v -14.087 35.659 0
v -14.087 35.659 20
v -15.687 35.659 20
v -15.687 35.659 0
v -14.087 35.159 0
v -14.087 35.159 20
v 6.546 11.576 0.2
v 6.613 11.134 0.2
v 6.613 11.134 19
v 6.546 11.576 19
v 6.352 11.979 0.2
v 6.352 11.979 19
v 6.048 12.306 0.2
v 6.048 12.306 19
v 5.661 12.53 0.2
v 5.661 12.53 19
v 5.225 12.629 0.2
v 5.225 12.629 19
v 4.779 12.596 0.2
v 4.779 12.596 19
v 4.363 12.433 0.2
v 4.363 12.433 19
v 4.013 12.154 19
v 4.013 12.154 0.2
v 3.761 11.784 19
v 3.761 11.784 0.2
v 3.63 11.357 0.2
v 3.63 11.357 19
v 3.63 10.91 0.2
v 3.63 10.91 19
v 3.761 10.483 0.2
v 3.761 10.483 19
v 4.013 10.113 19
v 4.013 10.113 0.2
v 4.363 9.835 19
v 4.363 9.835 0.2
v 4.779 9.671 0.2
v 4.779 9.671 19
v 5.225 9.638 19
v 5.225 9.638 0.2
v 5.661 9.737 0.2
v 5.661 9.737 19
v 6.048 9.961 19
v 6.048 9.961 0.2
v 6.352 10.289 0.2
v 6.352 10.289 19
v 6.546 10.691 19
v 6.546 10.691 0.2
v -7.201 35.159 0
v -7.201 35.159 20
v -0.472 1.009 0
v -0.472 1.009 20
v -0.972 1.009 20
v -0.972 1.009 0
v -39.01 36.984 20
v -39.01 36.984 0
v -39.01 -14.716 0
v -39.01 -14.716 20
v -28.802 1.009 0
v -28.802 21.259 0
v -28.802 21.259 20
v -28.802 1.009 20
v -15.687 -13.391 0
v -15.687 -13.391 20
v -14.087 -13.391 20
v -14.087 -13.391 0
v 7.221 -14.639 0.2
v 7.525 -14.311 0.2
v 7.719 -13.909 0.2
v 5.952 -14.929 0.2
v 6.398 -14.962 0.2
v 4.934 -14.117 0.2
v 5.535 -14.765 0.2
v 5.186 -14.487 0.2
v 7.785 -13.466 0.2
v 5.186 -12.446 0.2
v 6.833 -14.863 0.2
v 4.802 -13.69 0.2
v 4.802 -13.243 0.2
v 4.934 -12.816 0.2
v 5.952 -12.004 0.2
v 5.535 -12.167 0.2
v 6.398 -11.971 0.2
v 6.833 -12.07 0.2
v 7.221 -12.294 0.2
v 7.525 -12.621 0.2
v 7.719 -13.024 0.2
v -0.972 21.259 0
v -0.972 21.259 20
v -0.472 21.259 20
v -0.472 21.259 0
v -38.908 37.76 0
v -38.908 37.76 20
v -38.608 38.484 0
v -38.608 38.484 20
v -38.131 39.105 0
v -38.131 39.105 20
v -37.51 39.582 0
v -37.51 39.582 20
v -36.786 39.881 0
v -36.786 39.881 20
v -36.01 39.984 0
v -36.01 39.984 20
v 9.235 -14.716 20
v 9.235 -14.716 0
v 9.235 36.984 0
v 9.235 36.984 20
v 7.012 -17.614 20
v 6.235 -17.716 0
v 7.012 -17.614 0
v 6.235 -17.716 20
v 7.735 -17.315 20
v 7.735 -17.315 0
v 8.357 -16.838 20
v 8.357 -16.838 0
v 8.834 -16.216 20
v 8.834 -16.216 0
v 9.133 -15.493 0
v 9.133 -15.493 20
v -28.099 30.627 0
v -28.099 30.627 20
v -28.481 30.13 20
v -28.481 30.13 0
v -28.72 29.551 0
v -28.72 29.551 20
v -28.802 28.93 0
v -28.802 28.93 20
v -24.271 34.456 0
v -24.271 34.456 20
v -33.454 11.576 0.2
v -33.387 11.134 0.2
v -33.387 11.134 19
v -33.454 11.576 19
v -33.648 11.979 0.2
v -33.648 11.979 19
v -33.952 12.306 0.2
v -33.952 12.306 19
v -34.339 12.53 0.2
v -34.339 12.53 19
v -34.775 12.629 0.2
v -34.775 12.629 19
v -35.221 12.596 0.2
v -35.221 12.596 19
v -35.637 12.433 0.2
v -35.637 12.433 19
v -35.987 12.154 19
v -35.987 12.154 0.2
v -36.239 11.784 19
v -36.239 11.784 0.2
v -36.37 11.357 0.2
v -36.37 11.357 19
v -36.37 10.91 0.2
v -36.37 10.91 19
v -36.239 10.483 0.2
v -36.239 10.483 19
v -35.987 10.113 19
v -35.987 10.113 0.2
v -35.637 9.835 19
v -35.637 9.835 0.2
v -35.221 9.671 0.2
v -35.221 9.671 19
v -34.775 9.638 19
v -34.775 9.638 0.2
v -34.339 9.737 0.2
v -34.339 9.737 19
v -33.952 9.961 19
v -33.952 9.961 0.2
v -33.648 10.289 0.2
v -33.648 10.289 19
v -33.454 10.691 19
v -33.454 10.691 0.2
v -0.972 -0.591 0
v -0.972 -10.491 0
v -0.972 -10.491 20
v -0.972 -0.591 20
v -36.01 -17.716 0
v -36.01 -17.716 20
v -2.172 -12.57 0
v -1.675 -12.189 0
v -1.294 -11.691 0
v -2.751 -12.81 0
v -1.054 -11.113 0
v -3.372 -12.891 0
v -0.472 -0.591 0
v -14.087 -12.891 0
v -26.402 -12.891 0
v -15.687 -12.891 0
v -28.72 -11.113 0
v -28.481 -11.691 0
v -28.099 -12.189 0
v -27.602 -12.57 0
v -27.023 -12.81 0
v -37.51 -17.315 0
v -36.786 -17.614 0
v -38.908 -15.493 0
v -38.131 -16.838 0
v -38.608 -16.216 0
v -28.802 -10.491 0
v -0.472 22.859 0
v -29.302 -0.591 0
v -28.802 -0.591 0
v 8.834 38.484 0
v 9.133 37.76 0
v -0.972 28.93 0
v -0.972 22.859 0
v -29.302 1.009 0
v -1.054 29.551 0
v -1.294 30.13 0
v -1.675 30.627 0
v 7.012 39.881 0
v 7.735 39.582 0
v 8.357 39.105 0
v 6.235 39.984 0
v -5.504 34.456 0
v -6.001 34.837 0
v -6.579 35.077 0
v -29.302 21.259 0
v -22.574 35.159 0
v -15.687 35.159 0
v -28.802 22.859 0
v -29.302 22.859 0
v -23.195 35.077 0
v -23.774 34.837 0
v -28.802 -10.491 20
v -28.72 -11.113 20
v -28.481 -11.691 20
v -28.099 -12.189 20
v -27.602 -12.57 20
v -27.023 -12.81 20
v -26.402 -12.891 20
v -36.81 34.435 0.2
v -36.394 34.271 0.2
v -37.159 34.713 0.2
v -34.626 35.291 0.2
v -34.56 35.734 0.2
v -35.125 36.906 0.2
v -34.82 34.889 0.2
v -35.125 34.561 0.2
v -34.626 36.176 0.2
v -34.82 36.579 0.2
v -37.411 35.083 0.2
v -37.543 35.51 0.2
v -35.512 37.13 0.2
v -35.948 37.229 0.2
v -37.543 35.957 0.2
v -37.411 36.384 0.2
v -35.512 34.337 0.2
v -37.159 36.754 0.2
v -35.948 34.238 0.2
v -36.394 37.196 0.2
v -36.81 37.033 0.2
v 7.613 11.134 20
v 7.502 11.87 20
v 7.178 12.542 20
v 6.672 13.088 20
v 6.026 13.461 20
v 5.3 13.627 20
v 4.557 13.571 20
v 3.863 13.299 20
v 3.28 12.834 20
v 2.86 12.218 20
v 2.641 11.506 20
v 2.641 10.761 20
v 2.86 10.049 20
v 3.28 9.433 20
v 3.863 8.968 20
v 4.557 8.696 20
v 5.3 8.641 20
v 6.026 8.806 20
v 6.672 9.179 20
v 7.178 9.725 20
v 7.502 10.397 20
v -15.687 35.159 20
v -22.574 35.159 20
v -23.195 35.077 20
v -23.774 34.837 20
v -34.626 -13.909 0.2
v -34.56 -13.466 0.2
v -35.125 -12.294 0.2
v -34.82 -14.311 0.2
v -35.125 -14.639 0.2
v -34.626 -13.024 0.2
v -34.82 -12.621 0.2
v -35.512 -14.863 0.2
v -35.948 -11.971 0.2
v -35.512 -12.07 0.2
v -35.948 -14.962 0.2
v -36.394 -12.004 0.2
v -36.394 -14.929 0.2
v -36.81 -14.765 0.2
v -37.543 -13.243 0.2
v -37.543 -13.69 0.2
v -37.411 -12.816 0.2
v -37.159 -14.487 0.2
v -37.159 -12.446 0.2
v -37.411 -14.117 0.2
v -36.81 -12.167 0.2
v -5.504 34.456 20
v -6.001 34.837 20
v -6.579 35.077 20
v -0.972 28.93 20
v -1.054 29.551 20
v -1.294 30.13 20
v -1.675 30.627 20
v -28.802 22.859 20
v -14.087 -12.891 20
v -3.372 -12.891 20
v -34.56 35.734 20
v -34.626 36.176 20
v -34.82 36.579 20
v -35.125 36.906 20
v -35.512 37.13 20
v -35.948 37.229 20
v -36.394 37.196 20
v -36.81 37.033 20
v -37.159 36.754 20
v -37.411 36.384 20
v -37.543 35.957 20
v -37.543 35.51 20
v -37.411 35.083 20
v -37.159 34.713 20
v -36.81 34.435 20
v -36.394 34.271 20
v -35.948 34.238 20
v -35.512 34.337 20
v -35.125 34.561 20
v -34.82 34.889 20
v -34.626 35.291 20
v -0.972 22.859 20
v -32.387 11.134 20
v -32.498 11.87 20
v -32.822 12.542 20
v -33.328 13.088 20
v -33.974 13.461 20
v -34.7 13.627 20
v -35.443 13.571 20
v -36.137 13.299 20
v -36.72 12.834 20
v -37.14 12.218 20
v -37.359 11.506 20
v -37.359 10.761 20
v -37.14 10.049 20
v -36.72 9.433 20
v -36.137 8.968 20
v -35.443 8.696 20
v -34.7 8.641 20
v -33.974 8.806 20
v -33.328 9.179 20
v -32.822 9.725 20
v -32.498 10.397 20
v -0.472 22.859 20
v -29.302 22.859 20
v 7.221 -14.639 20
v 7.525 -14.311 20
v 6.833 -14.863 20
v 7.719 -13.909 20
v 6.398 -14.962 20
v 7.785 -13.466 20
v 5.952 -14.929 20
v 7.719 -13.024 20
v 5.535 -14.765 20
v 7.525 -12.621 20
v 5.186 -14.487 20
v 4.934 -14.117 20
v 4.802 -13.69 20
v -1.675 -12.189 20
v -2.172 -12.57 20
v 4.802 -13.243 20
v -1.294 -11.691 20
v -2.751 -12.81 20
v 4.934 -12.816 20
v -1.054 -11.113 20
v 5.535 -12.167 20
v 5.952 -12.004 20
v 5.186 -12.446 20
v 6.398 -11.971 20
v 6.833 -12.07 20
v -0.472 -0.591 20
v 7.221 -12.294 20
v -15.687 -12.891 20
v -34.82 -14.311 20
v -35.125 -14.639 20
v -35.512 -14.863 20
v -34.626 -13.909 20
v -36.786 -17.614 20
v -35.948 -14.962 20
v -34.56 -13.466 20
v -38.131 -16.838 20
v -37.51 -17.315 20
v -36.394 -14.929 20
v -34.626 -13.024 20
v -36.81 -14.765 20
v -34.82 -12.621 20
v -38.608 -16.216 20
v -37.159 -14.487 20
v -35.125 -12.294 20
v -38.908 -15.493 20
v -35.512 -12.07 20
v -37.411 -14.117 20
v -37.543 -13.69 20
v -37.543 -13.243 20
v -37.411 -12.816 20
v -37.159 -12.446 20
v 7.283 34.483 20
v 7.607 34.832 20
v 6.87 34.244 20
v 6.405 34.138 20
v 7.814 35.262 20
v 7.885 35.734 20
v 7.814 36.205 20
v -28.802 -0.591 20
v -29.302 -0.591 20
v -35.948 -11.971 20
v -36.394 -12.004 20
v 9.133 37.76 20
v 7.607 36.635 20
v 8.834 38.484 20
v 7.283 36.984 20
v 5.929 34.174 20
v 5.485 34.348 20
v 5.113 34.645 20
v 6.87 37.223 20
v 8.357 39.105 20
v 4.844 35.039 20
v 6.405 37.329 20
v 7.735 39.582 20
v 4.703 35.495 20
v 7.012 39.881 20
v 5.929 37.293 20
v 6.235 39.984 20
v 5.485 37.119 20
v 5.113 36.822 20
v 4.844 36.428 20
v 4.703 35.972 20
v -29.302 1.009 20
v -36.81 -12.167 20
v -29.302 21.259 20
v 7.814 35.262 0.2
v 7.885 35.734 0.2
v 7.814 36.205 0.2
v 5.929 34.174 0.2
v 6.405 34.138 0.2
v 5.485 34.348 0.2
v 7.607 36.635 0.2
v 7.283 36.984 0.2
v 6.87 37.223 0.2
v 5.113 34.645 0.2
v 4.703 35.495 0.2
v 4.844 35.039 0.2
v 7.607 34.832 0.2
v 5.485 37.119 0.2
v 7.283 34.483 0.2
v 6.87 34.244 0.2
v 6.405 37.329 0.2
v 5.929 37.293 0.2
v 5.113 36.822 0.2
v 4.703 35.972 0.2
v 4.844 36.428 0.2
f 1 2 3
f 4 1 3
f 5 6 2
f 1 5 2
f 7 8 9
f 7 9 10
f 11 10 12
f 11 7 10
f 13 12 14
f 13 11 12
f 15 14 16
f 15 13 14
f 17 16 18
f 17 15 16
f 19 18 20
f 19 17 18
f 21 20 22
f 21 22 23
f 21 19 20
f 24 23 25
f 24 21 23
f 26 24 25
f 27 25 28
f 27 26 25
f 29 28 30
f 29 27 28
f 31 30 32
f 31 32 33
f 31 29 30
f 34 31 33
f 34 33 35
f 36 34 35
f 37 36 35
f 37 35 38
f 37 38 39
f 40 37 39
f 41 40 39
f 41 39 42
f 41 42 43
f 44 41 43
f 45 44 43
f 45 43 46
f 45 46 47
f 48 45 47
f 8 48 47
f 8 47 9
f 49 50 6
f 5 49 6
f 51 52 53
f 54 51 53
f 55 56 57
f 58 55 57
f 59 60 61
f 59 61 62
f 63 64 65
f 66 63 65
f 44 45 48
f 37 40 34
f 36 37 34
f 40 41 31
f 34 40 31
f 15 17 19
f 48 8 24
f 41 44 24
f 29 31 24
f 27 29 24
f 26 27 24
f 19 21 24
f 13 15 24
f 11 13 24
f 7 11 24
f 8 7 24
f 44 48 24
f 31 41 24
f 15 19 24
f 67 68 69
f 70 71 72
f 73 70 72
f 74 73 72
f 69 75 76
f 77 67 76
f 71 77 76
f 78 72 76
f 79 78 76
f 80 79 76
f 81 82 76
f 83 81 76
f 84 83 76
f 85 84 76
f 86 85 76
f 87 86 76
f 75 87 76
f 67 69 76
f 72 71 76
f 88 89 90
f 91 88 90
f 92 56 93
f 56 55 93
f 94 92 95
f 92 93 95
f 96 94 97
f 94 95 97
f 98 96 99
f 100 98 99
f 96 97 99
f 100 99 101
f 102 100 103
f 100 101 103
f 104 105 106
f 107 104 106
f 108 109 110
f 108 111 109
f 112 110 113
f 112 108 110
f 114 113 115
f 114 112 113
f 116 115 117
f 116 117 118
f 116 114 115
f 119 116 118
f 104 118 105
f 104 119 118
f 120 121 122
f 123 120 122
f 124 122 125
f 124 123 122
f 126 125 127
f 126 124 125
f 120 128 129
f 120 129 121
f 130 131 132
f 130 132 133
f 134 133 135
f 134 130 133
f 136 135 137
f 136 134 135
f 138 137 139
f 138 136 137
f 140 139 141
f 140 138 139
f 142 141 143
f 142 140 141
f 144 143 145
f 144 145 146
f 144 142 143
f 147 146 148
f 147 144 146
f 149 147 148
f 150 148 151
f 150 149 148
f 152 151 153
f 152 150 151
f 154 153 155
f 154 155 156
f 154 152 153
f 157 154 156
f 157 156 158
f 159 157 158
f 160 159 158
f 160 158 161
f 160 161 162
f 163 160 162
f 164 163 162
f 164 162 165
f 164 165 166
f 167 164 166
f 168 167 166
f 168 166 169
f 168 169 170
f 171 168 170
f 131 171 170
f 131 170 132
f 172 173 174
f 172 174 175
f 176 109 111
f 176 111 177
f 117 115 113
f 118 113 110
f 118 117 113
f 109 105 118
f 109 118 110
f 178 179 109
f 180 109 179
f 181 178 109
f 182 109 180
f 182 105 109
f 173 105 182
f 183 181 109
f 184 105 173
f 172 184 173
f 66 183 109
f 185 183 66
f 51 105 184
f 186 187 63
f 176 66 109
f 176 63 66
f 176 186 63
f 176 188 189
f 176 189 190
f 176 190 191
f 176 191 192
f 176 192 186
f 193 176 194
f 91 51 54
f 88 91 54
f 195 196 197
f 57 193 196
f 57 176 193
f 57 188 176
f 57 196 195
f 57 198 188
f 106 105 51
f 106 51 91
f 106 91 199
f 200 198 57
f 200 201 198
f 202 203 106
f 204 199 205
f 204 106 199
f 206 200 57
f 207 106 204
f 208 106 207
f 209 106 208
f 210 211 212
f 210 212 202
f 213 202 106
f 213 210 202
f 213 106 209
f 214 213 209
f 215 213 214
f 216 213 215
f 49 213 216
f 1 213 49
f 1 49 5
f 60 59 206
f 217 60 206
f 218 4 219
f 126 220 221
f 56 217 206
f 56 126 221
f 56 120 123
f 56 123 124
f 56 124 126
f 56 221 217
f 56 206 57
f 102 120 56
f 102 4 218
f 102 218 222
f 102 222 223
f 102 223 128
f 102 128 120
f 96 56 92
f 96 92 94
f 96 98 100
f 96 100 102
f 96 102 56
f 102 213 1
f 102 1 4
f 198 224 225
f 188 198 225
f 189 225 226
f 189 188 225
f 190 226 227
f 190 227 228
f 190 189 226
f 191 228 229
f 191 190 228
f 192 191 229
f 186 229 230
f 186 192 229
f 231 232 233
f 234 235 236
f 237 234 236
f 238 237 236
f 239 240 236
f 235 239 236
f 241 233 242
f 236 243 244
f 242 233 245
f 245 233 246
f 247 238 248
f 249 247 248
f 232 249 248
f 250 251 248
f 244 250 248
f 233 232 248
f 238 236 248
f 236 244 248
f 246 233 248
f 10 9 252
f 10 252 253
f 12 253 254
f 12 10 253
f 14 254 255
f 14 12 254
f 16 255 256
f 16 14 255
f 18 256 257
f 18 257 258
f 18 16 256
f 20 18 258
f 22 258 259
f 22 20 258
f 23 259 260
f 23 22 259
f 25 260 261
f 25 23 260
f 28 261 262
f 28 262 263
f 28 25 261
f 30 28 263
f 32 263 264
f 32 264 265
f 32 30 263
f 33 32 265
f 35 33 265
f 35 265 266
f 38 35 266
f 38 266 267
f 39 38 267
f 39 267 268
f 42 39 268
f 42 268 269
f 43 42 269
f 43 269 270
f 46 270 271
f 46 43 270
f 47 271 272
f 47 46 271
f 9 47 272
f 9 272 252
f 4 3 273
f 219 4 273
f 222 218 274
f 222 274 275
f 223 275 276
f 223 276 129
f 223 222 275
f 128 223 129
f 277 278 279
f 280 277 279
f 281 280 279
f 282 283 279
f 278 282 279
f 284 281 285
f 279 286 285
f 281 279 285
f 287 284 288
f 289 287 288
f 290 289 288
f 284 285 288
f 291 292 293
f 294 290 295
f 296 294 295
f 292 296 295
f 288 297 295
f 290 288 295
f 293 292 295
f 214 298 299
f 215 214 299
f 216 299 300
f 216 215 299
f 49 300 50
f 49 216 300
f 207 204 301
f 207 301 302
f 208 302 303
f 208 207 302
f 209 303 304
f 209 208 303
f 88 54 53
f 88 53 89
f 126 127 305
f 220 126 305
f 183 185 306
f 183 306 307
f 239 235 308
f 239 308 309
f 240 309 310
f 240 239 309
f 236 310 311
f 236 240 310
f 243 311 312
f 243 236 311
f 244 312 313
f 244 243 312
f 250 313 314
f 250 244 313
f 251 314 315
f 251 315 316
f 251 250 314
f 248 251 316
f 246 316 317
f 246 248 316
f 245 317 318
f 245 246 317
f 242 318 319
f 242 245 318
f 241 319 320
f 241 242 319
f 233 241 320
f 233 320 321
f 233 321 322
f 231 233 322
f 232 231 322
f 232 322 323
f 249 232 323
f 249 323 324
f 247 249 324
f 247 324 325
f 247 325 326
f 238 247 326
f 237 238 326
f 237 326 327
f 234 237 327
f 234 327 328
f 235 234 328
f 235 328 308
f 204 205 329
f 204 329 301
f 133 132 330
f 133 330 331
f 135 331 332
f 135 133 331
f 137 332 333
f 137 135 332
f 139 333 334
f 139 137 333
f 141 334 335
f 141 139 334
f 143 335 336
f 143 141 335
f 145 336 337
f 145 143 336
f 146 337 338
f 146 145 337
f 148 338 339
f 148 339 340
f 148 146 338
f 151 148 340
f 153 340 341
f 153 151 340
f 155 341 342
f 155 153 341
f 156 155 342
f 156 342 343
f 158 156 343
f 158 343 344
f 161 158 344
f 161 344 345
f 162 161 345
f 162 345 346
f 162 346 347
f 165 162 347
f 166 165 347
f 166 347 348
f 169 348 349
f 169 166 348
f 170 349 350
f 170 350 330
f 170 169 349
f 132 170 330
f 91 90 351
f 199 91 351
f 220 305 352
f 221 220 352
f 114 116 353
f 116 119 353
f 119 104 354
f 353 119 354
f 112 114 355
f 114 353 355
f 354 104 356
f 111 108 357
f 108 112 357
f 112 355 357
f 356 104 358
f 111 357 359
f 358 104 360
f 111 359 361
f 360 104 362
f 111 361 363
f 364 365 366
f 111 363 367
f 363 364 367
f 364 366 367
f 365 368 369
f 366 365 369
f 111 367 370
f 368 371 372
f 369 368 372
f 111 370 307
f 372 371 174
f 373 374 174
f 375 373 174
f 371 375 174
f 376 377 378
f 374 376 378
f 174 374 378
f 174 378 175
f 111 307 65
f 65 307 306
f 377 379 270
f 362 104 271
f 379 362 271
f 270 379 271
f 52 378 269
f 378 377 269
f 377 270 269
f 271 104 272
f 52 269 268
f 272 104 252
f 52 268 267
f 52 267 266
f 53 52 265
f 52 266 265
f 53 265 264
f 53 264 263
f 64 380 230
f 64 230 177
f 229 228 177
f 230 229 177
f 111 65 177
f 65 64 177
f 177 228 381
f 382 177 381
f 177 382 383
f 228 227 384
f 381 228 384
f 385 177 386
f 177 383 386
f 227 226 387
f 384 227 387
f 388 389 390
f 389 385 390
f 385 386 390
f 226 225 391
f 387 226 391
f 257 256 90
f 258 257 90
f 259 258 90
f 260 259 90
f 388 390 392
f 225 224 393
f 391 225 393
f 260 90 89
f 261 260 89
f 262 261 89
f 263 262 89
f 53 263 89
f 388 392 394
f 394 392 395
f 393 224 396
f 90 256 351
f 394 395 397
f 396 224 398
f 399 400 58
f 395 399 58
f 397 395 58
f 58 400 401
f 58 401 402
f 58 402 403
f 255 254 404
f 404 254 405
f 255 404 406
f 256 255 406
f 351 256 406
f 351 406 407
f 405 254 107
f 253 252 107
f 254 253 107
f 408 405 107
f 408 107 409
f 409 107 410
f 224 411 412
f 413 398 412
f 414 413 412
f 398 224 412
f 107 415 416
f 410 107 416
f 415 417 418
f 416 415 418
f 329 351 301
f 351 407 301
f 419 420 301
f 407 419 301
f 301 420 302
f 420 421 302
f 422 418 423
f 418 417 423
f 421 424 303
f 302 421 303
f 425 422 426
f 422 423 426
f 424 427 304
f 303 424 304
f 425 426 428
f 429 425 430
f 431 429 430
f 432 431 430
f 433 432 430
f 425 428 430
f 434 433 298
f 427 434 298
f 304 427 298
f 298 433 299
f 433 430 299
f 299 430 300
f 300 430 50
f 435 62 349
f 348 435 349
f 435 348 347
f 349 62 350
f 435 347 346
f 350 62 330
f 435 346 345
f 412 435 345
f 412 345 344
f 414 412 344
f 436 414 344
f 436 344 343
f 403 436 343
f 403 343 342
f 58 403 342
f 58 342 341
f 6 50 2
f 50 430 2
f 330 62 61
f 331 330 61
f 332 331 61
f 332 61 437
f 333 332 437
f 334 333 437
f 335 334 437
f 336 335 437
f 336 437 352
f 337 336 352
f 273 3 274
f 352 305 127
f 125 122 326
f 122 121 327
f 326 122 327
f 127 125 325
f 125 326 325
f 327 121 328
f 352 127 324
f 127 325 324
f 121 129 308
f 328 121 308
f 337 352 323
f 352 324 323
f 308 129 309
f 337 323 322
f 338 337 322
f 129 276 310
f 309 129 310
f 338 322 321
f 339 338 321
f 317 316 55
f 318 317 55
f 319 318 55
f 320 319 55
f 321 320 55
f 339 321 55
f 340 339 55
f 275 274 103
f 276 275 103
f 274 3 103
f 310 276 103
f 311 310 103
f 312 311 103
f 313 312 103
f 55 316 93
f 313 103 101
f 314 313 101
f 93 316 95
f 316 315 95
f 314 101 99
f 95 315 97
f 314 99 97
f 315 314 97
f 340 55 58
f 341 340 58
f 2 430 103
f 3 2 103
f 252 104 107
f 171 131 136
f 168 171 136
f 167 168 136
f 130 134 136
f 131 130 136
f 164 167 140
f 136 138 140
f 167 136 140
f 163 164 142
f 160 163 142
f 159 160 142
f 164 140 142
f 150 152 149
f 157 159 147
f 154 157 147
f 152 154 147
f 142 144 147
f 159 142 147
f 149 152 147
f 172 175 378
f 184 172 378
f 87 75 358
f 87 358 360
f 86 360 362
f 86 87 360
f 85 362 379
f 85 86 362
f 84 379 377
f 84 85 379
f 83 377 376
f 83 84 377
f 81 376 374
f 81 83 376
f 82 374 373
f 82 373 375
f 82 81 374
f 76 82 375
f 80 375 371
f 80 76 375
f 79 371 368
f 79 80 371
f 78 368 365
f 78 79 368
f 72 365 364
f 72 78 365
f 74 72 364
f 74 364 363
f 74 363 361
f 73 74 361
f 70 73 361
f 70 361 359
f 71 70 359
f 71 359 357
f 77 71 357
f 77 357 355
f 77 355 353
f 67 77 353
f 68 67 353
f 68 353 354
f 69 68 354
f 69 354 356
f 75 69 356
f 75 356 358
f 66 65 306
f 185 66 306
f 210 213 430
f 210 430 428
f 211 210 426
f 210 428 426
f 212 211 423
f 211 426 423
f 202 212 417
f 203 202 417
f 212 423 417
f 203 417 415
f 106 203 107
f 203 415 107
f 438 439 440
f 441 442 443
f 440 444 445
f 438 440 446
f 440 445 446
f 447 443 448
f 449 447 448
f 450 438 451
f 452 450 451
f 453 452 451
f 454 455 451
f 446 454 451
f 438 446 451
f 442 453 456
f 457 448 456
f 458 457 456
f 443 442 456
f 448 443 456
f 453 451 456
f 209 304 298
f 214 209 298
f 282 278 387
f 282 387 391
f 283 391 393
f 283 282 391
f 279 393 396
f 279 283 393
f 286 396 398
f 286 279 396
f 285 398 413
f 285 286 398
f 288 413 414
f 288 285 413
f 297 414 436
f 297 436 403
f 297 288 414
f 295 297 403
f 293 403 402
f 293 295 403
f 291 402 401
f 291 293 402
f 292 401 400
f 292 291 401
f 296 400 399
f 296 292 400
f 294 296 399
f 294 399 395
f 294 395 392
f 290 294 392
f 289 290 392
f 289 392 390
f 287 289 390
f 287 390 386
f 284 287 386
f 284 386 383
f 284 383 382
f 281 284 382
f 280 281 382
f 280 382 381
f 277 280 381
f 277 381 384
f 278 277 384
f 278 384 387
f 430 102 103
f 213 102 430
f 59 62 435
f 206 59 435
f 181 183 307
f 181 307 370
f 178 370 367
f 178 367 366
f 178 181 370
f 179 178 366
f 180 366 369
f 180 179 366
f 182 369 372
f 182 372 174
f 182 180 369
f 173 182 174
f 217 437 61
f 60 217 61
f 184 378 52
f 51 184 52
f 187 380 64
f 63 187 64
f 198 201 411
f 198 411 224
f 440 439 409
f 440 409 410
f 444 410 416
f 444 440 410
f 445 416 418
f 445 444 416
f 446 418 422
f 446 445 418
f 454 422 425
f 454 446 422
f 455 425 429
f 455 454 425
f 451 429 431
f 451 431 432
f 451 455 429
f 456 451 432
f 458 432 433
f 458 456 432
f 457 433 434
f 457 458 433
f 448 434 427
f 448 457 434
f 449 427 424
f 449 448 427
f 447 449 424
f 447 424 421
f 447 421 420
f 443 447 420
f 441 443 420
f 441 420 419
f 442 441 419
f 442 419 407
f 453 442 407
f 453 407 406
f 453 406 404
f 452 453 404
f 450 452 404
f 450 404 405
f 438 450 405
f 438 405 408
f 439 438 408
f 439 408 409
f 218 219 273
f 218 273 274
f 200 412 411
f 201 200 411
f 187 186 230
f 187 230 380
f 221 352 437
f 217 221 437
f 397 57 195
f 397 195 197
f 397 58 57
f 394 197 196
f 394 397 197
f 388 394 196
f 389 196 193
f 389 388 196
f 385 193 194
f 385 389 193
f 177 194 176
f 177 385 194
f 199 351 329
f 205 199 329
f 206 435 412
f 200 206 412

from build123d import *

# Parameters (mm, degrees)
SZKIC1_R                    = 1.5
SZKIC1_R_2                  = 1.6
DODANIE_WYCI_GNI_CIE1_DEPTH = 20
ZAOKR_GLENIE1_R             = 3
SFAZOWANIE1_SIZE            = 1
SZKIC2_R                    = 1.5
SZKIC2_R_2                  = 1.6
DODANIE_WYCI_GNI_CIE2_DEPTH = 0.2


with BuildPart() as part:
    # Szkic1 → Dodanie-wyciągnięcie1 (new body)
    with BuildSketch(Plane.XY):
        Polygon((-39.009773604, 35.733555733), (-39.009773604, 39.983555733), (9.235464557, 39.983555733), (9.235464557, 35.733555733), (9.235464557, -13.466444267), (9.235464557, -17.716444267), (-39.009773604, -17.716444267), (-39.009773604, -13.466444267), align=None)
        with Locations((5.112845476, 11.133555733)):
            Circle(SZKIC1_R, mode=Mode.SUBTRACT)
        with Locations((-34.887154524, 11.133555733)):
            Circle(SZKIC1_R, mode=Mode.SUBTRACT)
        with Locations((6.285464557, -13.466444267)):
            Circle(SZKIC1_R, mode=Mode.SUBTRACT)
        with Locations((6.285464557, 35.733555733)):
            Circle(SZKIC1_R_2, mode=Mode.SUBTRACT)
        with Locations((-36.059773604, 35.733555733)):
            Circle(SZKIC1_R, mode=Mode.SUBTRACT)
        with Locations((-36.059773604, -13.466444267)):
            Circle(SZKIC1_R, mode=Mode.SUBTRACT)
        with BuildLine():
            Line((-14.087154524, -13.391444267), (-14.087154524, -12.891444267))
            Line((-14.087154524, -12.891444267), (-3.372154524, -12.891444267))
            ThreePointArc((-3.372154524, -12.891444267), (-1.675098249, -12.188500541), (-0.972154524, -10.491444267))
            Line((-0.972154524, -10.491444267), (-0.972154524, -0.591444267))
            Line((-0.972154524, -0.591444267), (-0.472154524, -0.591444267))
            Line((-0.472154524, -0.591444267), (-0.472154524, 1.008555733))
            Line((-0.472154524, 1.008555733), (-0.972154524, 1.008555733))
            Line((-0.972154524, 1.008555733), (-0.972154524, 21.258555733))
            Line((-0.972154524, 21.258555733), (-0.472154524, 21.258555733))
            Line((-0.472154524, 21.258555733), (-0.472154524, 22.858555733))
            Line((-0.472154524, 22.858555733), (-0.972154524, 22.858555733))
            Line((-0.972154524, 22.858555733), (-0.972154524, 28.930128609))
            ThreePointArc((-0.972154524, 28.930128609), (-1.154843646, 29.848568846), (-1.675098249, 30.627184884))
            Line((-1.675098249, 30.627184884), (-5.503525374, 34.455612008))
            ThreePointArc((-5.503525374, 34.455612008), (-6.282141411, 34.975866612), (-7.200581648, 35.158555733))
            Line((-7.200581648, 35.158555733), (-14.087154524, 35.158555733))
            Line((-14.087154524, 35.158555733), (-14.087154524, 35.658555733))
            Line((-14.087154524, 35.658555733), (-15.687154524, 35.658555733))
            Line((-15.687154524, 35.658555733), (-15.687154524, 35.158555733))
            Line((-15.687154524, 35.158555733), (-22.573727399, 35.158555733))
            ThreePointArc((-22.573727399, 35.158555733), (-23.492167637, 34.975866612), (-24.270783674, 34.455612008))
            Line((-24.270783674, 34.455612008), (-28.099210798, 30.627184884))
            ThreePointArc((-28.099210798, 30.627184884), (-28.619465402, 29.848568846), (-28.802154524, 28.930128609))
            Line((-28.802154524, 28.930128609), (-28.802154524, 22.858555733))
            Line((-28.802154524, 22.858555733), (-29.302154524, 22.858555733))
            Line((-29.302154524, 22.858555733), (-29.302154524, 21.258555733))
            Line((-29.302154524, 21.258555733), (-28.802154524, 21.258555733))
            Line((-28.802154524, 21.258555733), (-28.802154524, 1.008555733))
            Line((-28.802154524, 1.008555733), (-29.302154524, 1.008555733))
            Line((-29.302154524, 1.008555733), (-29.302154524, -0.591444267))
            Line((-29.302154524, -0.591444267), (-28.802154524, -0.591444267))
            Line((-28.802154524, -0.591444267), (-28.802154524, -10.491444267))
            ThreePointArc((-28.802154524, -10.491444267), (-28.099210798, -12.188500541), (-26.402154524, -12.891444267))
            Line((-26.402154524, -12.891444267), (-15.687154524, -12.891444267))
            Line((-15.687154524, -12.891444267), (-15.687154524, -13.391444267))
            Line((-15.687154524, -13.391444267), (-14.087154524, -13.391444267))
        make_face(mode=Mode.SUBTRACT)
    extrude(amount=DODANIE_WYCI_GNI_CIE1_DEPTH)

    # Zaokrąglenie1
    zaokr_glenie1_edges = [part.edges().sort_by_distance(p)[0] for p in [
        (-39.009773604, 39.983555733, 10),
        (9.235464557, 39.983555733, 10),
        (9.235464557, -17.716444267, 10),
        (-39.009773604, -17.716444267, 10),
    ]]
    fillet(zaokr_glenie1_edges, radius=ZAOKR_GLENIE1_R)

    # Sfazowanie1
    sfazowanie1_edges = [part.edges().sort_by_distance(p)[0] for p in [
        (3.612845476, 11.133555733, 20),
        (-36.387154524, 11.133555733, 20),
    ]]
    chamfer(sfazowanie1_edges, length=SFAZOWANIE1_SIZE)

    # Szkic2 → Dodanie-wyciągnięcie2 (add)
    with BuildSketch(Plane(origin=(0, 0, 0), x_dir=(-1, 0, 0), z_dir=(0, 0, -1))):
        with Locations((36.059773604, 35.733555733)):
            Circle(SZKIC2_R)
        with Locations((34.887154524, 11.133555733)):
            Circle(SZKIC2_R)
        with Locations((36.059773604, -13.466444267)):
            Circle(SZKIC2_R)
        with Locations((-6.285464557, 35.733555733)):
            Circle(SZKIC2_R_2)
        with Locations((-5.112845476, 11.133555733)):
            Circle(SZKIC2_R)
        with Locations((-6.285464557, -13.466444267)):
            Circle(SZKIC2_R)
    extrude(amount=-DODANIE_WYCI_GNI_CIE2_DEPTH)


solid = part.part
